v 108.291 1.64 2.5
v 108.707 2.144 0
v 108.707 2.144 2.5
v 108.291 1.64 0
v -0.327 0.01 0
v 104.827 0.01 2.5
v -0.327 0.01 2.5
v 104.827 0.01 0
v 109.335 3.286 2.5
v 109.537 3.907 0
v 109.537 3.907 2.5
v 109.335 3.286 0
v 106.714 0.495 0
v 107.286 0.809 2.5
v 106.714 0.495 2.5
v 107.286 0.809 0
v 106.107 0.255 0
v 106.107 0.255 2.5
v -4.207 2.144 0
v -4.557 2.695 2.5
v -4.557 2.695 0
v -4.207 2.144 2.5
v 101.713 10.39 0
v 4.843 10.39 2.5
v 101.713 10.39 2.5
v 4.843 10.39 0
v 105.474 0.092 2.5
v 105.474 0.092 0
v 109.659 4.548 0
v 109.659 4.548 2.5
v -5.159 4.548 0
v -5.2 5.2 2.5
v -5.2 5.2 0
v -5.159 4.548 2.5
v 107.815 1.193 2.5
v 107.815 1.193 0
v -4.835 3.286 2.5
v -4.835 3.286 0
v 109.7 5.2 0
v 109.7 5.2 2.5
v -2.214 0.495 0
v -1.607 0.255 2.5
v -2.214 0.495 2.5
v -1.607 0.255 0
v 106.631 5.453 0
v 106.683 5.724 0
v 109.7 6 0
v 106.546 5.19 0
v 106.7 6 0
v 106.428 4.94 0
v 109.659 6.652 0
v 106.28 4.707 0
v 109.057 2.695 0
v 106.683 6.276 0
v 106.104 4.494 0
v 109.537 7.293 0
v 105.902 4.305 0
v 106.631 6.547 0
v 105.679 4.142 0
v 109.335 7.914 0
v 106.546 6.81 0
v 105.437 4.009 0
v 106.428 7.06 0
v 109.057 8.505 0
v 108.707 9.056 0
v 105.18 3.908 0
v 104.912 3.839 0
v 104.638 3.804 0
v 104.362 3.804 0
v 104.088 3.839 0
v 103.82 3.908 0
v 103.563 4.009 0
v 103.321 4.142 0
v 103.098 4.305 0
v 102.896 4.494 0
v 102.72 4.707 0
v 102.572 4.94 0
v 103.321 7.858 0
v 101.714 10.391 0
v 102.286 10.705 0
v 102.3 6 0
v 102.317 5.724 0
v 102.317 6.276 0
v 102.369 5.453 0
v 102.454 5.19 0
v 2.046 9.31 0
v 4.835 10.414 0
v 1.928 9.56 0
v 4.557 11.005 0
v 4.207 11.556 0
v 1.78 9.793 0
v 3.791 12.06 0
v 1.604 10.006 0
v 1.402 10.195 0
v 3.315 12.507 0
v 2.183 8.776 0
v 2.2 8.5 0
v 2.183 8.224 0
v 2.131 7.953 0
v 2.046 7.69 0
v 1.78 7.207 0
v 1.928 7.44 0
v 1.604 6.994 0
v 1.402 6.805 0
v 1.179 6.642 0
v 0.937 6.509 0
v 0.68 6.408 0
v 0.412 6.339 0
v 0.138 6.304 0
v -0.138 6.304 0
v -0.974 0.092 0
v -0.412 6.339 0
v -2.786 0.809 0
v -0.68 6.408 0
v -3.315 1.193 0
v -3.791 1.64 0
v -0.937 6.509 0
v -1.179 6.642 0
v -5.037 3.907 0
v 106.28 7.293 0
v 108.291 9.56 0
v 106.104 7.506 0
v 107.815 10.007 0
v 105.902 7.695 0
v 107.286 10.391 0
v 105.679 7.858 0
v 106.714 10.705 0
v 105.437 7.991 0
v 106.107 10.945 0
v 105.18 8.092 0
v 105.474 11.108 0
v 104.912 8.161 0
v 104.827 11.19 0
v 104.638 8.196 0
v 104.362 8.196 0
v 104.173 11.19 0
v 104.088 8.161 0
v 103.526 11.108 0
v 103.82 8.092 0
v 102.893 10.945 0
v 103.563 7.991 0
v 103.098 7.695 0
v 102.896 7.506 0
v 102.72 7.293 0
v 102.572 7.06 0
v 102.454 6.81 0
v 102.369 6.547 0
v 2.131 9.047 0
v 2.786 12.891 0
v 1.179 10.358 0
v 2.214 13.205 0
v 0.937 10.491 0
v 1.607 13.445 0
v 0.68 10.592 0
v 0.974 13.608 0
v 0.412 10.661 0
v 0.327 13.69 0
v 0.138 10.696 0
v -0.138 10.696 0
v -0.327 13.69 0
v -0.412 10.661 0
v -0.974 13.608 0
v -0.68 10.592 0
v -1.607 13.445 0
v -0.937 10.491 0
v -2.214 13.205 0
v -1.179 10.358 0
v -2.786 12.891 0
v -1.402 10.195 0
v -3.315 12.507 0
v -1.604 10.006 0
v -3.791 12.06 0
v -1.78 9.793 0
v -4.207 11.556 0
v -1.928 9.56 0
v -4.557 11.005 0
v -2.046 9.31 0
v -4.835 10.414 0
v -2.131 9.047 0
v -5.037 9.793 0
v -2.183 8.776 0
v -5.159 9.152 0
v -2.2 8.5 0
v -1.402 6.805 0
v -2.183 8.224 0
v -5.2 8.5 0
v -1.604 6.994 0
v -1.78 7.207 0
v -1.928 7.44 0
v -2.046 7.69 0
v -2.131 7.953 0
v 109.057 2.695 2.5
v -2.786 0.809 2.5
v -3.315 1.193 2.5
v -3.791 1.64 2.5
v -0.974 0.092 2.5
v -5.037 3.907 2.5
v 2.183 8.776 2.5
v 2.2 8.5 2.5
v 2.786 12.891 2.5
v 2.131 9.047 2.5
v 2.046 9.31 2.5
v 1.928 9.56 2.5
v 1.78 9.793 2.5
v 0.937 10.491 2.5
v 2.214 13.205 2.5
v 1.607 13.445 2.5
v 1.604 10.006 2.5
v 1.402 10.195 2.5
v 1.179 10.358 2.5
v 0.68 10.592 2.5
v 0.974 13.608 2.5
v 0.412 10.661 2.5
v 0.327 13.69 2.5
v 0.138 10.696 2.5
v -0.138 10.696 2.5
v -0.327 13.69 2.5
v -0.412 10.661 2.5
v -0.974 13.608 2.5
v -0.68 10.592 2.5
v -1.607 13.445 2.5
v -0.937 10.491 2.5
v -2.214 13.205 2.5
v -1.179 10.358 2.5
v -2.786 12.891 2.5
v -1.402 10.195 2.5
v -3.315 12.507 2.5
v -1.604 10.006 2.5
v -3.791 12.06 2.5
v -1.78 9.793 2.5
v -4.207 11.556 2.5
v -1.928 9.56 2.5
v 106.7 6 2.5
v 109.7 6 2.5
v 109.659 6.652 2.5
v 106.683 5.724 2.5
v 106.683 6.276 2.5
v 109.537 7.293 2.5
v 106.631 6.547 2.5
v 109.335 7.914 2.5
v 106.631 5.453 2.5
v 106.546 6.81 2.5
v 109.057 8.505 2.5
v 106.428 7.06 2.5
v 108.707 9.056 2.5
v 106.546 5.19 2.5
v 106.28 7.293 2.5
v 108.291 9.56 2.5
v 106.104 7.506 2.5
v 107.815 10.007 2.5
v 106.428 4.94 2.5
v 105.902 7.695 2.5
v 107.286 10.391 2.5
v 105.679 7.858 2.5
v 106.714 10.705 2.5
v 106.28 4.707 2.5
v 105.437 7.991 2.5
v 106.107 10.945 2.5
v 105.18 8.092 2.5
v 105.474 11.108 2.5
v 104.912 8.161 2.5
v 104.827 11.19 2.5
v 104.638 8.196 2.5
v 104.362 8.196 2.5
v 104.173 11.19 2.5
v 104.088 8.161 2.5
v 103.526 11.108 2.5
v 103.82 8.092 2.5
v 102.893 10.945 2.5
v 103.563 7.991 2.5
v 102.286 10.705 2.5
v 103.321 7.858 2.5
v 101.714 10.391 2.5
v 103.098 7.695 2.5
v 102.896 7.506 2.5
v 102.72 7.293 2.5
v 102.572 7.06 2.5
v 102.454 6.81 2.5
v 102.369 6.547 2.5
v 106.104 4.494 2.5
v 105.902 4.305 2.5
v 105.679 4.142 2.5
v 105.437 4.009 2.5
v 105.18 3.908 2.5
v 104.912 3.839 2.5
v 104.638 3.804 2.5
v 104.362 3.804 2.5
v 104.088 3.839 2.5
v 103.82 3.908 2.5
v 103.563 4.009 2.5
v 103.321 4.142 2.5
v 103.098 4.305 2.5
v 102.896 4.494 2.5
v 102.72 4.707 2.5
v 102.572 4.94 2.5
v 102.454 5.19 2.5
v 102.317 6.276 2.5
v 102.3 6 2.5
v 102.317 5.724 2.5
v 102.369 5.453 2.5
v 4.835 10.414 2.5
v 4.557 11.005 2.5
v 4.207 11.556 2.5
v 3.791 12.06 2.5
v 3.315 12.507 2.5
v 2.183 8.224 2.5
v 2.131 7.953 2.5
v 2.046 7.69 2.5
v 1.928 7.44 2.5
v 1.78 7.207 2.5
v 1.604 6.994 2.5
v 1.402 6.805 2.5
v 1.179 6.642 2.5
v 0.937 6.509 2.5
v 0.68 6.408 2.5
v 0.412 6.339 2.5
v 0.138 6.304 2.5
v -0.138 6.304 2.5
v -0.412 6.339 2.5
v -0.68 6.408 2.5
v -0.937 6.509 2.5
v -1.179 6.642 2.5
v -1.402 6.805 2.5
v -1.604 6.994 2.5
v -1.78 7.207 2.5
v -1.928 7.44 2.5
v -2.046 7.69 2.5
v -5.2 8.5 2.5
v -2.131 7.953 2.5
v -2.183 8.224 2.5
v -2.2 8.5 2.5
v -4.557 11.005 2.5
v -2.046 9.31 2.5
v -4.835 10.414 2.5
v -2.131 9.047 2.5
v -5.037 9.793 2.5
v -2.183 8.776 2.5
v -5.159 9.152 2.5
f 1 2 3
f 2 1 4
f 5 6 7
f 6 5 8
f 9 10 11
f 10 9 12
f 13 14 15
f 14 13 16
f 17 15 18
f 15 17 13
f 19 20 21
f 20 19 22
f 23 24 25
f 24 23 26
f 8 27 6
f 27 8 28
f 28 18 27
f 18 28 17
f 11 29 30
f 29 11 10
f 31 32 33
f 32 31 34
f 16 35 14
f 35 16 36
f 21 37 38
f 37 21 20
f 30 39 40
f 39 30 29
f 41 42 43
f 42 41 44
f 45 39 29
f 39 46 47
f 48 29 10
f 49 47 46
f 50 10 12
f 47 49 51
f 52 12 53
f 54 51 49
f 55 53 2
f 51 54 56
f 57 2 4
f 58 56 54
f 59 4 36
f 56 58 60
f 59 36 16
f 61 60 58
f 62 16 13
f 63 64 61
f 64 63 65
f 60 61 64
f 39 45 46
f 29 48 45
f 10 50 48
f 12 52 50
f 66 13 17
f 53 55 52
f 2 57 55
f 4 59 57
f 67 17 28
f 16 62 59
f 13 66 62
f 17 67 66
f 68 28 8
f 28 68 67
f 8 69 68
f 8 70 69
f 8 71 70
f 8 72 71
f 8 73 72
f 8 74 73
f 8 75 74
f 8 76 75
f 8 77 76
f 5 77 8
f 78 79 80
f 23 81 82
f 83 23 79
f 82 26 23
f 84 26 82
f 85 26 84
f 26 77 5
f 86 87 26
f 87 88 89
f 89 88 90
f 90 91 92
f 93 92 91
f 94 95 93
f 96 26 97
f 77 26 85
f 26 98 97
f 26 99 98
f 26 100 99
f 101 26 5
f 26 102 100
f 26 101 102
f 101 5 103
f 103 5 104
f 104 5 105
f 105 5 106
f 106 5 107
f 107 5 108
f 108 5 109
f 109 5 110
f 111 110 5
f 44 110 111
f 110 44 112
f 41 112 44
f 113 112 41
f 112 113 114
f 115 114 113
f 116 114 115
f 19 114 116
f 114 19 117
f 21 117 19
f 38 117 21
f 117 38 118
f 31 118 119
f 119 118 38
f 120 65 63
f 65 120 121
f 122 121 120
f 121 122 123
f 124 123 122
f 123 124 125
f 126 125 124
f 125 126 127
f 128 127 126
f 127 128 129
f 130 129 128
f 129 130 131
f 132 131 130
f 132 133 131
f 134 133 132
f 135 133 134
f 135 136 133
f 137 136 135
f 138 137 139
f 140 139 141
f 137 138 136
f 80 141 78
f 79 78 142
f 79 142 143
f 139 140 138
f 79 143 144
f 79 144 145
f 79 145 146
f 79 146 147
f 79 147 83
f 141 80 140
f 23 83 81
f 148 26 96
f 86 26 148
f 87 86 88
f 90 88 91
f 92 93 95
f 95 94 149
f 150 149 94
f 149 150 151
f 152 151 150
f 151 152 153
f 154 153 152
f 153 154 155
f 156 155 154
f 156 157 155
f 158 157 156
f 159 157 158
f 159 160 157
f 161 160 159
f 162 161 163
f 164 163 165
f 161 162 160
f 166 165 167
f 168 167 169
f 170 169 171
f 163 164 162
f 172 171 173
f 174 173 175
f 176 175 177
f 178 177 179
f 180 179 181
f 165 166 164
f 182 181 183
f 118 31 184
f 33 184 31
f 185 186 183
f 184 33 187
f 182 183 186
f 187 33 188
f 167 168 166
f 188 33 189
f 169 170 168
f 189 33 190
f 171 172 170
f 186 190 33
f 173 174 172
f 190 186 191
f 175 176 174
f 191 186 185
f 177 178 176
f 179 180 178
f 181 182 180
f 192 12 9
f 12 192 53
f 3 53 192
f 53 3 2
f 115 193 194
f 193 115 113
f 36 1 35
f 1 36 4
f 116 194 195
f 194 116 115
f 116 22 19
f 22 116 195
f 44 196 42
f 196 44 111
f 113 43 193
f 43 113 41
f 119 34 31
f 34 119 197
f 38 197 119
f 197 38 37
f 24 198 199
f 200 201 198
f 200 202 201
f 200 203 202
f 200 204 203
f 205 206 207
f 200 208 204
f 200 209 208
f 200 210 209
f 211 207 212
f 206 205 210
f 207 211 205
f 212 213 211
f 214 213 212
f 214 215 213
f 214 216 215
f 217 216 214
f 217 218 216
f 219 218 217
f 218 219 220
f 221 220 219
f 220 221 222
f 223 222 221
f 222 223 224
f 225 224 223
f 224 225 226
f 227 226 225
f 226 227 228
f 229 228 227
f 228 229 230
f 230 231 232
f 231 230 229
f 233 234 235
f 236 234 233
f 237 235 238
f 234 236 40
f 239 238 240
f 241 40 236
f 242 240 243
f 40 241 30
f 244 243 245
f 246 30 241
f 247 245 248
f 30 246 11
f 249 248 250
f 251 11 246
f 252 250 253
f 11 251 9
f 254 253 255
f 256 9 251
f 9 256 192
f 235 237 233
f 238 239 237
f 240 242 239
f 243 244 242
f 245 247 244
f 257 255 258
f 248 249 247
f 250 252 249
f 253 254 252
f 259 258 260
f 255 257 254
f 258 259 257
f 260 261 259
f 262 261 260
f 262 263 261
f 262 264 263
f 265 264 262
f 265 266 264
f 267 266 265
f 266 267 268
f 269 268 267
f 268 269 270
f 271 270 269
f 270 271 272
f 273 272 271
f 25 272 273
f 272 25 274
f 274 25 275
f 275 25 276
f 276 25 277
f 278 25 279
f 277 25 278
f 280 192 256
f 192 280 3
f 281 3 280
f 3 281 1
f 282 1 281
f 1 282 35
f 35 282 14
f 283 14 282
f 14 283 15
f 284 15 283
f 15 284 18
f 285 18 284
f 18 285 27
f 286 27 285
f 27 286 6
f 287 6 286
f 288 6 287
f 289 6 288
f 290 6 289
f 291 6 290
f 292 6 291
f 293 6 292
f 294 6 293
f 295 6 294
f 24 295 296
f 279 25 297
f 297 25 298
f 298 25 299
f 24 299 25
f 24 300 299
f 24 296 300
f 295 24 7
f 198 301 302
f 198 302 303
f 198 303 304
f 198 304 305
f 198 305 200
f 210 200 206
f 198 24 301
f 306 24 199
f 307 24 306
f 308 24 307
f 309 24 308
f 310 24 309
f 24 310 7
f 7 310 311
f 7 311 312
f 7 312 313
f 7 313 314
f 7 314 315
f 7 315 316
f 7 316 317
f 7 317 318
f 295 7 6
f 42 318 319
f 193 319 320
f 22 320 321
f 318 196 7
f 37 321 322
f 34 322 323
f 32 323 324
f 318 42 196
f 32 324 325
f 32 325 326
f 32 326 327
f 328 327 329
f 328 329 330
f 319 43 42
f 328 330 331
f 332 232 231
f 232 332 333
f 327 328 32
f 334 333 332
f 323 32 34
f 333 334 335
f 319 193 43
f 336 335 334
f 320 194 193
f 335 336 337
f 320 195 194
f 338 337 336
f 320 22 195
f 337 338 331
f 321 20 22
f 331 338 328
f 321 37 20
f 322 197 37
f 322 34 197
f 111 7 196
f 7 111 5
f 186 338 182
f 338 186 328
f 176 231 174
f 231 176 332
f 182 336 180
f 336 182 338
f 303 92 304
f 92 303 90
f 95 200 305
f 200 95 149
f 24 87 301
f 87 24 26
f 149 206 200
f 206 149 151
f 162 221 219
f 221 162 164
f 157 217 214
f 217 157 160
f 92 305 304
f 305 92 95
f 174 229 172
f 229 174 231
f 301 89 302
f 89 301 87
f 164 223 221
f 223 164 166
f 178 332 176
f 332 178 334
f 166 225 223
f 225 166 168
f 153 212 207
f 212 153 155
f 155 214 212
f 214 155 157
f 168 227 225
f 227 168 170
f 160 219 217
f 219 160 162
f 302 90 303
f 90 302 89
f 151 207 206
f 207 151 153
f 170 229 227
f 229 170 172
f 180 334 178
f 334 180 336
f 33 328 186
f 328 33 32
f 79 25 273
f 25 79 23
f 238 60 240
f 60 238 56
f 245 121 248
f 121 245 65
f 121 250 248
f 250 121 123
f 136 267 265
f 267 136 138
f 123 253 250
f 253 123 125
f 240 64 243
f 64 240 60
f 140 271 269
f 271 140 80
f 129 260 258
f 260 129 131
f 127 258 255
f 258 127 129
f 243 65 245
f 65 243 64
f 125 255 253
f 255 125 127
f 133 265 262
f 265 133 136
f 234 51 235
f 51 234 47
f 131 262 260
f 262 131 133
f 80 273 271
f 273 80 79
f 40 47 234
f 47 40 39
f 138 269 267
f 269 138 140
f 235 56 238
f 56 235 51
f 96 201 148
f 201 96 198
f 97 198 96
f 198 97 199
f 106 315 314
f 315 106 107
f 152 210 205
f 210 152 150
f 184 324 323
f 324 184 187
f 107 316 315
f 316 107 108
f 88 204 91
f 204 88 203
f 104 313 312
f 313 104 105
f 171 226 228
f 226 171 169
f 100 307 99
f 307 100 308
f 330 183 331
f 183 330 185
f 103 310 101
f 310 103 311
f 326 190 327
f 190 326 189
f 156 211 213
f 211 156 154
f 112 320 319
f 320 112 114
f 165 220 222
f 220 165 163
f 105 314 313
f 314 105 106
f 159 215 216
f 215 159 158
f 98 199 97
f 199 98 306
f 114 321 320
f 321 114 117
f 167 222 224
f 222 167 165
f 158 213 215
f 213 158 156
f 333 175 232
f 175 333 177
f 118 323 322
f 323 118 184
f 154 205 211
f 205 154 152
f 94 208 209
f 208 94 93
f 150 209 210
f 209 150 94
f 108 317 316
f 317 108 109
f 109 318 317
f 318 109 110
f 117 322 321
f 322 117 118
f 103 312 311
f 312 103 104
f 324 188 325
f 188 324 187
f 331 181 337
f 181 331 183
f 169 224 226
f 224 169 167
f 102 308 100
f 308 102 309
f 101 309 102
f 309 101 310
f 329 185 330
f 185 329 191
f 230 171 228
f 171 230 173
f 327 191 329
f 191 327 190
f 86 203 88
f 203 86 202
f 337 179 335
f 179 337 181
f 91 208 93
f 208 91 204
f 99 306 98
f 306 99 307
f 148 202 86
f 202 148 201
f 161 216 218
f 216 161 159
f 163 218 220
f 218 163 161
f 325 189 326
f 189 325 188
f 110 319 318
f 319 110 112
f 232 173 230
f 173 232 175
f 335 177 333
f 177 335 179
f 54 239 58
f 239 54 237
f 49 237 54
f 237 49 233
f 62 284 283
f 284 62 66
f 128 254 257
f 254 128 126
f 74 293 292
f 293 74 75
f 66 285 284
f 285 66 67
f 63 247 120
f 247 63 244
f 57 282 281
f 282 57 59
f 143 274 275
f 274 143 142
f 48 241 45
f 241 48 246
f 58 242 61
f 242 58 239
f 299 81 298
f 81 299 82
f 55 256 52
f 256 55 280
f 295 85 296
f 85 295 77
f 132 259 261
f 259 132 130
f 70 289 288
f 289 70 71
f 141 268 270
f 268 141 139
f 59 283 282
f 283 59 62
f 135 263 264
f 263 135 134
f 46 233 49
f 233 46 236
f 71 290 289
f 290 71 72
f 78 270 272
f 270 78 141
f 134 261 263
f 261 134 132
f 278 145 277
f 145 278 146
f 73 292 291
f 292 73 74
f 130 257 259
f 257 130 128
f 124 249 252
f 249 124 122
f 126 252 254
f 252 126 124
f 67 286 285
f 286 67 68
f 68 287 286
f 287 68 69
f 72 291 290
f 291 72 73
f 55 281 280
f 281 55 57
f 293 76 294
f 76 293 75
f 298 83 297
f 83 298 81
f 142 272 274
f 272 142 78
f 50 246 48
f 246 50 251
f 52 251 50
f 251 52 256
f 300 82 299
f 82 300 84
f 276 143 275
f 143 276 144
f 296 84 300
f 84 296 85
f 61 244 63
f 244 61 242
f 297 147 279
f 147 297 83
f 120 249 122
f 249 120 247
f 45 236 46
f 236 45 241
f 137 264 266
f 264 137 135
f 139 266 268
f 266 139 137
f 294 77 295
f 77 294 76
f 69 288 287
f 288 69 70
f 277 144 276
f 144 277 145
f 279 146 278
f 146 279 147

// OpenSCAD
// HE brake pedal tactile
// dayton puck mount
$fn=50;

PEDAL_BRACKET_WIDTH = 36.5;

HOLE_DISTANCE = 104.5; // distance between the two support holes


TOP_HOLE_DZ = 8.5; // distance from top hole to back of bracket
BOTTOM_HOLE_DZ = 6;

BRACKET_WALL_DEPTH = 2.5; // depth of wall along bracket
BRACKET_WALL_BORDER = 3;
PUCK_SUPPORT_DEPTH = 5;

TAPPED_HOLE_R = 1.5;

SUPPORT_HOLE_R = 2.2;
OVERLAP=0.1;

hr = SUPPORT_HOLE_R + BRACKET_WALL_BORDER;

!difference() {
  
  union() {
    
    // draw two cylinder at the bracket face for use with a hull()
    hull() {
      translate([0, hr, 0])
      cylinder(h = BRACKET_WALL_DEPTH, r= hr);
      //cube([w, BRACKET_WALL_DEPTH, w]);
      translate([HOLE_DISTANCE, hr, 0])
      cylinder(h = BRACKET_WALL_DEPTH, r= hr);
    }
    
    hull() {
      translate([0, hr, 0])
      cylinder(h = BRACKET_WALL_DEPTH, r= hr);
      translate([0, TOP_HOLE_DZ, 0])
      cylinder(h = BRACKET_WALL_DEPTH, r= hr);
    }
    

    hull() {
      translate([HOLE_DISTANCE, hr, 0])
      cylinder(h = BRACKET_WALL_DEPTH, r= hr);
      translate([HOLE_DISTANCE, BOTTOM_HOLE_DZ, 0])
      cylinder(h = BRACKET_WALL_DEPTH, r= hr);
    }


  }


  translate([0, TOP_HOLE_DZ, -OVERLAP])
  cylinder(h = BRACKET_WALL_DEPTH  + OVERLAP * 2, r= SUPPORT_HOLE_R);


  translate([HOLE_DISTANCE, BOTTOM_HOLE_DZ, -OVERLAP])
  cylinder(h = BRACKET_WALL_DEPTH  + OVERLAP * 2, r= SUPPORT_HOLE_R);
}



difference() {
  
  linear_extrude(BRACKET_WALL_DEPTH)
  offset(r=-BRACKET_WALL_BORDER / 2)
  offset(r=BRACKET_WALL_BORDER * 2)
  // make a thin polygon around the points we want to use
  polygon([
    [-0.1, 0],
    [HOLE_DISTANCE + 0.1, 0],
    [HOLE_DISTANCE + 0.1, BOTTOM_HOLE_DZ],
    [HOLE_DISTANCE - 0.1, BOTTOM_HOLE_DZ],
    [HOLE_DISTANCE + 0.1, 0.1],
    [0.1, 0.1],
    [0.1, TOP_HOLE_DZ],
    [-0.1, TOP_HOLE_DZ]
  ]);
  
  translate([0, TOP_HOLE_DZ, -OVERLAP])
  cylinder(h = BRACKET_WALL_DEPTH  + OVERLAP * 2, r= SUPPORT_HOLE_R);


  translate([HOLE_DISTANCE, BOTTOM_HOLE_DZ, -OVERLAP])
  cylinder(h = BRACKET_WALL_DEPTH  + OVERLAP * 2, r= SUPPORT_HOLE_R);
  
}
